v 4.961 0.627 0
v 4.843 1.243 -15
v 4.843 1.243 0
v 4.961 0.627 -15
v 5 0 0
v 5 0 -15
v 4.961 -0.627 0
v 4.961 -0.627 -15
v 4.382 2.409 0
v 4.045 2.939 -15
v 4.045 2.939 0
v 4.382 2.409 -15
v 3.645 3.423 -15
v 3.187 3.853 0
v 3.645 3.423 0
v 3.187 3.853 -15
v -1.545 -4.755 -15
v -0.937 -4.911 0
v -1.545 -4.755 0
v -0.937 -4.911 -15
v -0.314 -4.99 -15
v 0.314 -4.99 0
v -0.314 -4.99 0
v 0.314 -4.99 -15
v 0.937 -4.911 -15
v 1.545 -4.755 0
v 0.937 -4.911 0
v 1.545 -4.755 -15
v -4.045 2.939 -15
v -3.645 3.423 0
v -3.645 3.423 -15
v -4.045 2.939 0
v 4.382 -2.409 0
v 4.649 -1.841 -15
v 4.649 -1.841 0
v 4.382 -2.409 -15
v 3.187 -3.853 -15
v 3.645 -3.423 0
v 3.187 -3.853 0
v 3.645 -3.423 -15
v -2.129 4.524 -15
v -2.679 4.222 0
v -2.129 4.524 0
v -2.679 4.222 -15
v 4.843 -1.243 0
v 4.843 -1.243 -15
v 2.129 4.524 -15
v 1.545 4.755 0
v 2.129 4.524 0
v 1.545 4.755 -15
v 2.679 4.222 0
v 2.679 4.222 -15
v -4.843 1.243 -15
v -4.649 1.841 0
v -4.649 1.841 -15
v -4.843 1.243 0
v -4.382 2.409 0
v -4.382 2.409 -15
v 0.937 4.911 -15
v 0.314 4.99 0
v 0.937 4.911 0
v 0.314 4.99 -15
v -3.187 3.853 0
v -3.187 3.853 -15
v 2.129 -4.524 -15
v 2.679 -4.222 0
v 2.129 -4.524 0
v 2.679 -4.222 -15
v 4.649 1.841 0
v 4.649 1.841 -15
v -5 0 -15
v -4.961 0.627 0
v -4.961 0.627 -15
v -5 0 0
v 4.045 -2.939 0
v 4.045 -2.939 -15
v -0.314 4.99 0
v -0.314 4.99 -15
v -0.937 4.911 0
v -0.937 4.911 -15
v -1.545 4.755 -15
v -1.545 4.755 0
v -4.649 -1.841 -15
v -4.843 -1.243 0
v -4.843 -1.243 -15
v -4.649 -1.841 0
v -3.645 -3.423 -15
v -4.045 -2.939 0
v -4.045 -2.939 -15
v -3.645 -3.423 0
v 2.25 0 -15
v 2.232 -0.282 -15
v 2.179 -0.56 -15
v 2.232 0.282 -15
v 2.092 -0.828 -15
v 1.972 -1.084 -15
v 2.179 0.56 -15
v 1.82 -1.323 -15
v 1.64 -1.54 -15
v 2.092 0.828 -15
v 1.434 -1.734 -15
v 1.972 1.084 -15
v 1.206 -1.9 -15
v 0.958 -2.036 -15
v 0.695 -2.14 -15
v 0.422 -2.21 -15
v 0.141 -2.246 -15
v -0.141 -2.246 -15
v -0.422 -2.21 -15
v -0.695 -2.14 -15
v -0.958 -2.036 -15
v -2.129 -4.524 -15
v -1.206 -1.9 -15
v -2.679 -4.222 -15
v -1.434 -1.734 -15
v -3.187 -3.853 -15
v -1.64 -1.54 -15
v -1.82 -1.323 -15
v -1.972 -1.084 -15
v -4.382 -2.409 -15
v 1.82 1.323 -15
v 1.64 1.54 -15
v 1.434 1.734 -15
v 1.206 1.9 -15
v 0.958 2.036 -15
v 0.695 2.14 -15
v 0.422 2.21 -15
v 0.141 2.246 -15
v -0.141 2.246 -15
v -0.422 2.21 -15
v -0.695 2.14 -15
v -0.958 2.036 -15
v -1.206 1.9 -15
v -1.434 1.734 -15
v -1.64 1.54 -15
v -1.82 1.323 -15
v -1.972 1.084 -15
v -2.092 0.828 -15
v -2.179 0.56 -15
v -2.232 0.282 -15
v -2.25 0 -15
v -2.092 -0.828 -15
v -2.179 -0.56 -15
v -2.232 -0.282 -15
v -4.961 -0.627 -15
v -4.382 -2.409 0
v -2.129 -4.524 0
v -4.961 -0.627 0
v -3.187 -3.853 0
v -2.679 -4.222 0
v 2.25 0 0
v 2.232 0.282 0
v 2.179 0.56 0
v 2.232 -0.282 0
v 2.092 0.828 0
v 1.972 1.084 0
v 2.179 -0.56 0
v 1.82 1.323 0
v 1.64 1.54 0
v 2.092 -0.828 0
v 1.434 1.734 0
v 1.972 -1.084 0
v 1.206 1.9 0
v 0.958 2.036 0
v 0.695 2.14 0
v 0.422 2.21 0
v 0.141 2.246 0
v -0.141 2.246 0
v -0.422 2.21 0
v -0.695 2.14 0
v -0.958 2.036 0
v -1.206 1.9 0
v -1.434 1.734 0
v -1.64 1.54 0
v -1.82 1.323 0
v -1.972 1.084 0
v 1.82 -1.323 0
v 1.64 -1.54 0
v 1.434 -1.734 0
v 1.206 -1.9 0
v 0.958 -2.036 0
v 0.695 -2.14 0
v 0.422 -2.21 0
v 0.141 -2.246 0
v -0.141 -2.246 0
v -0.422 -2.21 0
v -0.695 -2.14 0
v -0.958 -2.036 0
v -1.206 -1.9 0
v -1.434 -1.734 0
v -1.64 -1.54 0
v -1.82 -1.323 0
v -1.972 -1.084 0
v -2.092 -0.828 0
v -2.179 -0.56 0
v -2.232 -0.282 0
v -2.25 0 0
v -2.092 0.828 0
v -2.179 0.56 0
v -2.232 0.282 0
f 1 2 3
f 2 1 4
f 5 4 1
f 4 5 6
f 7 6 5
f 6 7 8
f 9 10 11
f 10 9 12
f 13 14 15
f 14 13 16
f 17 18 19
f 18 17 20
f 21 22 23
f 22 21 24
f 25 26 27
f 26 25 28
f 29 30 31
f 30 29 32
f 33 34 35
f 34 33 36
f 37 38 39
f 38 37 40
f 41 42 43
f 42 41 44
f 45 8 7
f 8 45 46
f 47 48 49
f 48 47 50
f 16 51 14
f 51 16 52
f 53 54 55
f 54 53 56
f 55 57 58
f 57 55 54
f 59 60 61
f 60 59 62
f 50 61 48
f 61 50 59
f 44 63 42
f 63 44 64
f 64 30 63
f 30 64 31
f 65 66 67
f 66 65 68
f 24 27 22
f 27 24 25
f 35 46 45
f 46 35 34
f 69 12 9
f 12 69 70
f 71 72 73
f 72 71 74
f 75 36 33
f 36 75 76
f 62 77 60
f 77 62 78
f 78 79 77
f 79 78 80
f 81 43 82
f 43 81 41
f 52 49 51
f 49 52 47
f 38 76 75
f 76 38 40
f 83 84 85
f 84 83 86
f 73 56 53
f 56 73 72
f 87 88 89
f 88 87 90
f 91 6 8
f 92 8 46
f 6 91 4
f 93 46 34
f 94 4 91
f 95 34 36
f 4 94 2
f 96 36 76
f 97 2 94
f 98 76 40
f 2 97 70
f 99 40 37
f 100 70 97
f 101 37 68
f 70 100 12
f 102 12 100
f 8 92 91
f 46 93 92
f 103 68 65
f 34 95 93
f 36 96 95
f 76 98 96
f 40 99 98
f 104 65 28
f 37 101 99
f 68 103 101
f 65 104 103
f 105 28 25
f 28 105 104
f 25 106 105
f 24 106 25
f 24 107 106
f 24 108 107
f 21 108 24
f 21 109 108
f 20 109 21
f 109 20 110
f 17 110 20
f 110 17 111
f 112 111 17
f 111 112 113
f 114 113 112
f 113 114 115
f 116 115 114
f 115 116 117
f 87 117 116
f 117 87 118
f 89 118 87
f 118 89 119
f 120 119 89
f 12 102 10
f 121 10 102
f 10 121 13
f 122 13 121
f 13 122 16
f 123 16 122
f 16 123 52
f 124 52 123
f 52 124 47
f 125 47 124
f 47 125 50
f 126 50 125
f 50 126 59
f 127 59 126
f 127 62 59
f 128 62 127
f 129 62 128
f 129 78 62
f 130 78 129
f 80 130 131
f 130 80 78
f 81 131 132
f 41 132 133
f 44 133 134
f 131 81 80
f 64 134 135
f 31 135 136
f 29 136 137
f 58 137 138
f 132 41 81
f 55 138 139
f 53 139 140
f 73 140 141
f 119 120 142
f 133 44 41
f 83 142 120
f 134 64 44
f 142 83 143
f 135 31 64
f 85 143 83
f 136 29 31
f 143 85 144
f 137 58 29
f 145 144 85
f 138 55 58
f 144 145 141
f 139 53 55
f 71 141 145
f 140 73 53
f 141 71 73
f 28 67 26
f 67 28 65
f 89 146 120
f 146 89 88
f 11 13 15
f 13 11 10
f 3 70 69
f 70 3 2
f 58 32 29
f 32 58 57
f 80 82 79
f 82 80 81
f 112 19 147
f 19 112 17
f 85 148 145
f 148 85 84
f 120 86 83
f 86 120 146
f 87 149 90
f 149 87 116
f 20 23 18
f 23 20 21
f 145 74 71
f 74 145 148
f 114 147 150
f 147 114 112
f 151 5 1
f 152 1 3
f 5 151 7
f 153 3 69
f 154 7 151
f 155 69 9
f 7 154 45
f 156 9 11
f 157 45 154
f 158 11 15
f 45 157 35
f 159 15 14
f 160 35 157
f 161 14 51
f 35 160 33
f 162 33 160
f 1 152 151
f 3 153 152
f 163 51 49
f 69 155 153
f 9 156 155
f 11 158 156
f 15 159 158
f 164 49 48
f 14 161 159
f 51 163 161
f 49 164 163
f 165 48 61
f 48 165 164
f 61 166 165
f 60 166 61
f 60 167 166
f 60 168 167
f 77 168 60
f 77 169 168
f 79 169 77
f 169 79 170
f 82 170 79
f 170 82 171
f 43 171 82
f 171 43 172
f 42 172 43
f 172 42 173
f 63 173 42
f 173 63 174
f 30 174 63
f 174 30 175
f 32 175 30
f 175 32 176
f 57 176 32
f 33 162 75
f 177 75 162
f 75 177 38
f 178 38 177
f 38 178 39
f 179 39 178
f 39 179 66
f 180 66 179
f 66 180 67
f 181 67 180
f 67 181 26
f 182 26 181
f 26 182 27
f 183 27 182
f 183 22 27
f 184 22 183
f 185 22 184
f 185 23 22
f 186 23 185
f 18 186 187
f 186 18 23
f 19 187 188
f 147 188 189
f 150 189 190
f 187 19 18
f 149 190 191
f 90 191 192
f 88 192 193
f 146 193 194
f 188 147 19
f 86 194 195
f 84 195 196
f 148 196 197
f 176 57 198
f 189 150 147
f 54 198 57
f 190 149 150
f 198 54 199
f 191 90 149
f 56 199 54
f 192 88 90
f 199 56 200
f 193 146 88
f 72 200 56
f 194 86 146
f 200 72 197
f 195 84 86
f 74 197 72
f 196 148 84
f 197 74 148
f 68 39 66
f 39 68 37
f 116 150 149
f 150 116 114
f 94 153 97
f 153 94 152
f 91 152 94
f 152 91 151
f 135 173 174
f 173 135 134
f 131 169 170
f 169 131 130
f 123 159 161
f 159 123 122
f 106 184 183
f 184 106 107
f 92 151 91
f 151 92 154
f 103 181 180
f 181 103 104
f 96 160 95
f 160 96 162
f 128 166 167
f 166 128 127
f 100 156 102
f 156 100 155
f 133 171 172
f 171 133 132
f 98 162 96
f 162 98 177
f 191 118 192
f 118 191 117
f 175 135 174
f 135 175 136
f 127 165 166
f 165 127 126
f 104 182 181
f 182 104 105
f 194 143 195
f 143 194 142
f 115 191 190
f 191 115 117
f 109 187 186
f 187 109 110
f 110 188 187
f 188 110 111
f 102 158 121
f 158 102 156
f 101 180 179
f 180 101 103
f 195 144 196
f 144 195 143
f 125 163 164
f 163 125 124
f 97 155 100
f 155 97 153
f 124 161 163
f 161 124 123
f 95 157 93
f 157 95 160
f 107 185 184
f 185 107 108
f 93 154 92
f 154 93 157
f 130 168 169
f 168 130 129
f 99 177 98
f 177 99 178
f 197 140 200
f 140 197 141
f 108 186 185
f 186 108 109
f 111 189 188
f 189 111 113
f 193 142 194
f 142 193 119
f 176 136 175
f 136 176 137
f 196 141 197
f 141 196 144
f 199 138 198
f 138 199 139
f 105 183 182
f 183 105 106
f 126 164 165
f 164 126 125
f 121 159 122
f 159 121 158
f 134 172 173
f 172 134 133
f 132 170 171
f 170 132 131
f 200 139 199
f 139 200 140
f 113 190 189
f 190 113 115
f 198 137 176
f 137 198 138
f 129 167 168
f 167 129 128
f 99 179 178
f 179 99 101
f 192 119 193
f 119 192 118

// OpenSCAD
$fn = 50;


difference() {
	union() {
		translate(v = [0, 0, -15.0000000000]) {
			cylinder(h = 15, r = 5.0000000000);
		}
		cylinder(h = 0, r = 8.0000000000);
	}
	union() {
		#translate(v = [0, 0, -15]) {
			cylinder(h = 15, r = 2.2500000000);
		}
	}
}
